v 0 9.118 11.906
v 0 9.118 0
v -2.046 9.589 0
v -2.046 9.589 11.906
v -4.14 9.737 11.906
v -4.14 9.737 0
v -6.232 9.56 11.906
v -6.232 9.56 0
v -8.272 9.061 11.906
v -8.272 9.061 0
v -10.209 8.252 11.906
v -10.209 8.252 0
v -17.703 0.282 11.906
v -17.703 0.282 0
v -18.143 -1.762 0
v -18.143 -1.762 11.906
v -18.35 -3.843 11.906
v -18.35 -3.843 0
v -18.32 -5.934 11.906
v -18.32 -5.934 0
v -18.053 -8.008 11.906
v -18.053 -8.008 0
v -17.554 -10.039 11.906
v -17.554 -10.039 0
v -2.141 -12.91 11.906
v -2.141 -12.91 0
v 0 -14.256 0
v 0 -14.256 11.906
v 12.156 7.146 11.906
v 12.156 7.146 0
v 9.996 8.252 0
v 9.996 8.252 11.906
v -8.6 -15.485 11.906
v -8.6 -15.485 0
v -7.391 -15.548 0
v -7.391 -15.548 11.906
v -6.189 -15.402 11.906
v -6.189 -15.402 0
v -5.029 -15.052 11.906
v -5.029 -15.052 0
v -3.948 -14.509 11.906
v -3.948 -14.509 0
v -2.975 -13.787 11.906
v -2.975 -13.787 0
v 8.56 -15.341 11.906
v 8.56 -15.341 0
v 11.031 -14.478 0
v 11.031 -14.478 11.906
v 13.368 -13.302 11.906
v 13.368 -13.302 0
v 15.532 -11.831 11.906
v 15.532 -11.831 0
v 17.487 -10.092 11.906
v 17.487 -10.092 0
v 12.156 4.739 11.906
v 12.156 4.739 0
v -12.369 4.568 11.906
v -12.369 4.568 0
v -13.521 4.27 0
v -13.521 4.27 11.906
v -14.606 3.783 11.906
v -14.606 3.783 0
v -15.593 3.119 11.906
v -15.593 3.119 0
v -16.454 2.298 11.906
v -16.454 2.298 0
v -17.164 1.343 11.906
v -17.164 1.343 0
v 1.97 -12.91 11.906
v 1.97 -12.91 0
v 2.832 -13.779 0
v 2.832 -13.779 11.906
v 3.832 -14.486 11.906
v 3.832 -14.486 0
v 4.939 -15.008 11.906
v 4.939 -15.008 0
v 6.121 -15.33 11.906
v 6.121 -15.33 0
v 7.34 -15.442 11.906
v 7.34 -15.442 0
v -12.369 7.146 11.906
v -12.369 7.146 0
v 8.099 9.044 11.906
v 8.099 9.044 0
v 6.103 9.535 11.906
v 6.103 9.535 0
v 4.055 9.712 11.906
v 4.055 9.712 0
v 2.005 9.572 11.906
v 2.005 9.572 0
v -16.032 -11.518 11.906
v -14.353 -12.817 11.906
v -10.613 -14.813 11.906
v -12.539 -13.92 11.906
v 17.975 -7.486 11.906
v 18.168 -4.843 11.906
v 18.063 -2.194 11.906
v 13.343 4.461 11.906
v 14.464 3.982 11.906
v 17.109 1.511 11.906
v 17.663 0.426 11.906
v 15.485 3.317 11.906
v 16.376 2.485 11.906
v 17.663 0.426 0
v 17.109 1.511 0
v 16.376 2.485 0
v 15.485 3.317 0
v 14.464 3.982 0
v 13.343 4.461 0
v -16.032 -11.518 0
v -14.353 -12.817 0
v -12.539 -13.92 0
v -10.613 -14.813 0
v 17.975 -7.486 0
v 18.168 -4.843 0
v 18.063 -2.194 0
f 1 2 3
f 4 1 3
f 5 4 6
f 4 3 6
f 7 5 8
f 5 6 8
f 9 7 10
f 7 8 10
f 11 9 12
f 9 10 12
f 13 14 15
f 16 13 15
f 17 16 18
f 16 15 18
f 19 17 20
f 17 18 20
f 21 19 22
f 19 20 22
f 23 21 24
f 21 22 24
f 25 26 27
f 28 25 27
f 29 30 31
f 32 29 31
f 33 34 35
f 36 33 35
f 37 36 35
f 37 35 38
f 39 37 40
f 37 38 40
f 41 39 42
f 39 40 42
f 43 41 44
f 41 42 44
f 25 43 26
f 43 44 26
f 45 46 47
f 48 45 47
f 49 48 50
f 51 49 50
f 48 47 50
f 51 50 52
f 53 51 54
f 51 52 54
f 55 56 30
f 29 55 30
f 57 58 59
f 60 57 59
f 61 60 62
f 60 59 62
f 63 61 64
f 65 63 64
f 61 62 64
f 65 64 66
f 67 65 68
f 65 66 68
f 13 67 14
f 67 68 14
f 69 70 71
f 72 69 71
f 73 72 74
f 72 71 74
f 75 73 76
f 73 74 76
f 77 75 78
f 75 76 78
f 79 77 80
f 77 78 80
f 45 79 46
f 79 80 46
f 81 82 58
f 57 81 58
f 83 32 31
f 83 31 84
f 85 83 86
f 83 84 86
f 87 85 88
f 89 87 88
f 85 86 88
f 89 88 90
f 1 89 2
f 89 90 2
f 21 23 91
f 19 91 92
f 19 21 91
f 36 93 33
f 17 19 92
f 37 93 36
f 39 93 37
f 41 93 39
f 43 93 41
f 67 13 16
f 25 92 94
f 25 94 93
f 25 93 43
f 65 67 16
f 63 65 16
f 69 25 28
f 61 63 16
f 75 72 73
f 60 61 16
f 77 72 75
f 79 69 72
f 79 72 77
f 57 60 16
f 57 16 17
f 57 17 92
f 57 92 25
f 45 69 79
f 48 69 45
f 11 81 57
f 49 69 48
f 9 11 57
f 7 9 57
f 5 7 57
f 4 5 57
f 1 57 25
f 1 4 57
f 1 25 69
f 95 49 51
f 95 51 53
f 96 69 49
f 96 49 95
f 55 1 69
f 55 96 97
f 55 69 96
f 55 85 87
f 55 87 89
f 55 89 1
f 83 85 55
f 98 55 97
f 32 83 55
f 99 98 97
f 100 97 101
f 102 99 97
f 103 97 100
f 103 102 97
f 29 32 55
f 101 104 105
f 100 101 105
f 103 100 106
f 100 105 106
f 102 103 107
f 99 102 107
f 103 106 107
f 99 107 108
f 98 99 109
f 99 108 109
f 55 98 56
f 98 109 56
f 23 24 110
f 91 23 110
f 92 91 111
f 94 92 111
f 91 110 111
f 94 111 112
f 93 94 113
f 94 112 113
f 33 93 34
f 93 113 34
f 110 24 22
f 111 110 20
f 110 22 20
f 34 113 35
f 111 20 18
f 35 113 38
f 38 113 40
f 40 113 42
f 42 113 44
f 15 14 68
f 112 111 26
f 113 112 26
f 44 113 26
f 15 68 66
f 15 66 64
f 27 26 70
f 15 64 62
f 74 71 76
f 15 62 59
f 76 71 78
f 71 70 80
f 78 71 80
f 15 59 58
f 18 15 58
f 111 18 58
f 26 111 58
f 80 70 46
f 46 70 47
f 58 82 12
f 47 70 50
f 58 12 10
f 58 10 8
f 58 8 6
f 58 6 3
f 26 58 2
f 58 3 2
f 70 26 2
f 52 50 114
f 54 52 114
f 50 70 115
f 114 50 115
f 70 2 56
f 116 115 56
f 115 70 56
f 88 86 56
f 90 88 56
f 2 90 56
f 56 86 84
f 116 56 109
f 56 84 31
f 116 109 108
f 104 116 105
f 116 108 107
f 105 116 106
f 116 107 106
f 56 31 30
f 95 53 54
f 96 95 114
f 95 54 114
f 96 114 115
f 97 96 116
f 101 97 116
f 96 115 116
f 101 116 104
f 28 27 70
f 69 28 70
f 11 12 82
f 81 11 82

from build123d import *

# Parameters (mm, degrees)
F1_DEPTH = 11.90625


# Not quite as in the source:
# - a length typed as a fraction of an inch, garbled in the dataset ("3 / 203.2 mm" for 3/8 in), is restored


with BuildPart() as f1:
    # F0 (on Top) → F1 (new body)
    with BuildSketch(Plane.XY):
        with BuildLine():
            ThreePointArc((0, 9.1178910807), (-5.1898410508, 9.6890057882), (-10.2093555033, 8.2519613206))
            Line((-10.2093555033, 8.2519613206), (-12.369341217, 7.1464567445))
            Line((-12.369341217, 7.1464567445), (-12.369341217, 4.6386048198))
            Line((-12.369341217, 4.6386048198), (-12.369341217, 4.5682978211))
            ThreePointArc((-12.369341217, 4.5682978211), (-15.5930977879, 3.1185654947), (-17.7027139134, 0.2823972963))
            ThreePointArc((-17.7027139134, 0.2823972963), (-18.3641606661, -4.889059653), (-17.5542831421, -10.0393583998))
            ThreePointArc((-17.5542831421, -10.0393583998), (-13.4613837791, -13.3941238354), (-8.5996589687, -15.484556372))
            ThreePointArc((-8.5996589687, -15.484556372), (-5.0294162563, -15.0523544446), (-2.1409380715, -12.9098966718))
            Line((-2.1409380715, -12.9098966718), (0, -14.2561570176))
            Line((0, -14.2561570176), (1.9696742658, -12.9098966718))
            ThreePointArc((1.9696742658, -12.9098966718), (4.9392756736, -15.0084468105), (8.560301624, -15.3410370587))
            ThreePointArc((8.560301624, -15.3410370587), (13.367982191, -13.3015402533), (17.4874793738, -10.0916987285))
            ThreePointArc((17.4874793738, -10.0916987285), (18.16772005, -4.8427956267), (17.6633565687, 0.4259166096))
            ThreePointArc((17.6633565687, 0.4259166096), (15.4847616458, 3.3168082822), (12.1560195839, 4.739132713))
            Line((12.1560195839, 4.739132713), (12.1560195839, 7.1464567445))
            Line((12.1560195839, 7.1464567445), (9.9960338703, 8.2519613206))
            ThreePointArc((9.9960338703, 8.2519613206), (5.0827762692, 9.6633625741), (0, 9.1178910807))
        make_face()
    extrude(amount=F1_DEPTH)


solid = f1.part
